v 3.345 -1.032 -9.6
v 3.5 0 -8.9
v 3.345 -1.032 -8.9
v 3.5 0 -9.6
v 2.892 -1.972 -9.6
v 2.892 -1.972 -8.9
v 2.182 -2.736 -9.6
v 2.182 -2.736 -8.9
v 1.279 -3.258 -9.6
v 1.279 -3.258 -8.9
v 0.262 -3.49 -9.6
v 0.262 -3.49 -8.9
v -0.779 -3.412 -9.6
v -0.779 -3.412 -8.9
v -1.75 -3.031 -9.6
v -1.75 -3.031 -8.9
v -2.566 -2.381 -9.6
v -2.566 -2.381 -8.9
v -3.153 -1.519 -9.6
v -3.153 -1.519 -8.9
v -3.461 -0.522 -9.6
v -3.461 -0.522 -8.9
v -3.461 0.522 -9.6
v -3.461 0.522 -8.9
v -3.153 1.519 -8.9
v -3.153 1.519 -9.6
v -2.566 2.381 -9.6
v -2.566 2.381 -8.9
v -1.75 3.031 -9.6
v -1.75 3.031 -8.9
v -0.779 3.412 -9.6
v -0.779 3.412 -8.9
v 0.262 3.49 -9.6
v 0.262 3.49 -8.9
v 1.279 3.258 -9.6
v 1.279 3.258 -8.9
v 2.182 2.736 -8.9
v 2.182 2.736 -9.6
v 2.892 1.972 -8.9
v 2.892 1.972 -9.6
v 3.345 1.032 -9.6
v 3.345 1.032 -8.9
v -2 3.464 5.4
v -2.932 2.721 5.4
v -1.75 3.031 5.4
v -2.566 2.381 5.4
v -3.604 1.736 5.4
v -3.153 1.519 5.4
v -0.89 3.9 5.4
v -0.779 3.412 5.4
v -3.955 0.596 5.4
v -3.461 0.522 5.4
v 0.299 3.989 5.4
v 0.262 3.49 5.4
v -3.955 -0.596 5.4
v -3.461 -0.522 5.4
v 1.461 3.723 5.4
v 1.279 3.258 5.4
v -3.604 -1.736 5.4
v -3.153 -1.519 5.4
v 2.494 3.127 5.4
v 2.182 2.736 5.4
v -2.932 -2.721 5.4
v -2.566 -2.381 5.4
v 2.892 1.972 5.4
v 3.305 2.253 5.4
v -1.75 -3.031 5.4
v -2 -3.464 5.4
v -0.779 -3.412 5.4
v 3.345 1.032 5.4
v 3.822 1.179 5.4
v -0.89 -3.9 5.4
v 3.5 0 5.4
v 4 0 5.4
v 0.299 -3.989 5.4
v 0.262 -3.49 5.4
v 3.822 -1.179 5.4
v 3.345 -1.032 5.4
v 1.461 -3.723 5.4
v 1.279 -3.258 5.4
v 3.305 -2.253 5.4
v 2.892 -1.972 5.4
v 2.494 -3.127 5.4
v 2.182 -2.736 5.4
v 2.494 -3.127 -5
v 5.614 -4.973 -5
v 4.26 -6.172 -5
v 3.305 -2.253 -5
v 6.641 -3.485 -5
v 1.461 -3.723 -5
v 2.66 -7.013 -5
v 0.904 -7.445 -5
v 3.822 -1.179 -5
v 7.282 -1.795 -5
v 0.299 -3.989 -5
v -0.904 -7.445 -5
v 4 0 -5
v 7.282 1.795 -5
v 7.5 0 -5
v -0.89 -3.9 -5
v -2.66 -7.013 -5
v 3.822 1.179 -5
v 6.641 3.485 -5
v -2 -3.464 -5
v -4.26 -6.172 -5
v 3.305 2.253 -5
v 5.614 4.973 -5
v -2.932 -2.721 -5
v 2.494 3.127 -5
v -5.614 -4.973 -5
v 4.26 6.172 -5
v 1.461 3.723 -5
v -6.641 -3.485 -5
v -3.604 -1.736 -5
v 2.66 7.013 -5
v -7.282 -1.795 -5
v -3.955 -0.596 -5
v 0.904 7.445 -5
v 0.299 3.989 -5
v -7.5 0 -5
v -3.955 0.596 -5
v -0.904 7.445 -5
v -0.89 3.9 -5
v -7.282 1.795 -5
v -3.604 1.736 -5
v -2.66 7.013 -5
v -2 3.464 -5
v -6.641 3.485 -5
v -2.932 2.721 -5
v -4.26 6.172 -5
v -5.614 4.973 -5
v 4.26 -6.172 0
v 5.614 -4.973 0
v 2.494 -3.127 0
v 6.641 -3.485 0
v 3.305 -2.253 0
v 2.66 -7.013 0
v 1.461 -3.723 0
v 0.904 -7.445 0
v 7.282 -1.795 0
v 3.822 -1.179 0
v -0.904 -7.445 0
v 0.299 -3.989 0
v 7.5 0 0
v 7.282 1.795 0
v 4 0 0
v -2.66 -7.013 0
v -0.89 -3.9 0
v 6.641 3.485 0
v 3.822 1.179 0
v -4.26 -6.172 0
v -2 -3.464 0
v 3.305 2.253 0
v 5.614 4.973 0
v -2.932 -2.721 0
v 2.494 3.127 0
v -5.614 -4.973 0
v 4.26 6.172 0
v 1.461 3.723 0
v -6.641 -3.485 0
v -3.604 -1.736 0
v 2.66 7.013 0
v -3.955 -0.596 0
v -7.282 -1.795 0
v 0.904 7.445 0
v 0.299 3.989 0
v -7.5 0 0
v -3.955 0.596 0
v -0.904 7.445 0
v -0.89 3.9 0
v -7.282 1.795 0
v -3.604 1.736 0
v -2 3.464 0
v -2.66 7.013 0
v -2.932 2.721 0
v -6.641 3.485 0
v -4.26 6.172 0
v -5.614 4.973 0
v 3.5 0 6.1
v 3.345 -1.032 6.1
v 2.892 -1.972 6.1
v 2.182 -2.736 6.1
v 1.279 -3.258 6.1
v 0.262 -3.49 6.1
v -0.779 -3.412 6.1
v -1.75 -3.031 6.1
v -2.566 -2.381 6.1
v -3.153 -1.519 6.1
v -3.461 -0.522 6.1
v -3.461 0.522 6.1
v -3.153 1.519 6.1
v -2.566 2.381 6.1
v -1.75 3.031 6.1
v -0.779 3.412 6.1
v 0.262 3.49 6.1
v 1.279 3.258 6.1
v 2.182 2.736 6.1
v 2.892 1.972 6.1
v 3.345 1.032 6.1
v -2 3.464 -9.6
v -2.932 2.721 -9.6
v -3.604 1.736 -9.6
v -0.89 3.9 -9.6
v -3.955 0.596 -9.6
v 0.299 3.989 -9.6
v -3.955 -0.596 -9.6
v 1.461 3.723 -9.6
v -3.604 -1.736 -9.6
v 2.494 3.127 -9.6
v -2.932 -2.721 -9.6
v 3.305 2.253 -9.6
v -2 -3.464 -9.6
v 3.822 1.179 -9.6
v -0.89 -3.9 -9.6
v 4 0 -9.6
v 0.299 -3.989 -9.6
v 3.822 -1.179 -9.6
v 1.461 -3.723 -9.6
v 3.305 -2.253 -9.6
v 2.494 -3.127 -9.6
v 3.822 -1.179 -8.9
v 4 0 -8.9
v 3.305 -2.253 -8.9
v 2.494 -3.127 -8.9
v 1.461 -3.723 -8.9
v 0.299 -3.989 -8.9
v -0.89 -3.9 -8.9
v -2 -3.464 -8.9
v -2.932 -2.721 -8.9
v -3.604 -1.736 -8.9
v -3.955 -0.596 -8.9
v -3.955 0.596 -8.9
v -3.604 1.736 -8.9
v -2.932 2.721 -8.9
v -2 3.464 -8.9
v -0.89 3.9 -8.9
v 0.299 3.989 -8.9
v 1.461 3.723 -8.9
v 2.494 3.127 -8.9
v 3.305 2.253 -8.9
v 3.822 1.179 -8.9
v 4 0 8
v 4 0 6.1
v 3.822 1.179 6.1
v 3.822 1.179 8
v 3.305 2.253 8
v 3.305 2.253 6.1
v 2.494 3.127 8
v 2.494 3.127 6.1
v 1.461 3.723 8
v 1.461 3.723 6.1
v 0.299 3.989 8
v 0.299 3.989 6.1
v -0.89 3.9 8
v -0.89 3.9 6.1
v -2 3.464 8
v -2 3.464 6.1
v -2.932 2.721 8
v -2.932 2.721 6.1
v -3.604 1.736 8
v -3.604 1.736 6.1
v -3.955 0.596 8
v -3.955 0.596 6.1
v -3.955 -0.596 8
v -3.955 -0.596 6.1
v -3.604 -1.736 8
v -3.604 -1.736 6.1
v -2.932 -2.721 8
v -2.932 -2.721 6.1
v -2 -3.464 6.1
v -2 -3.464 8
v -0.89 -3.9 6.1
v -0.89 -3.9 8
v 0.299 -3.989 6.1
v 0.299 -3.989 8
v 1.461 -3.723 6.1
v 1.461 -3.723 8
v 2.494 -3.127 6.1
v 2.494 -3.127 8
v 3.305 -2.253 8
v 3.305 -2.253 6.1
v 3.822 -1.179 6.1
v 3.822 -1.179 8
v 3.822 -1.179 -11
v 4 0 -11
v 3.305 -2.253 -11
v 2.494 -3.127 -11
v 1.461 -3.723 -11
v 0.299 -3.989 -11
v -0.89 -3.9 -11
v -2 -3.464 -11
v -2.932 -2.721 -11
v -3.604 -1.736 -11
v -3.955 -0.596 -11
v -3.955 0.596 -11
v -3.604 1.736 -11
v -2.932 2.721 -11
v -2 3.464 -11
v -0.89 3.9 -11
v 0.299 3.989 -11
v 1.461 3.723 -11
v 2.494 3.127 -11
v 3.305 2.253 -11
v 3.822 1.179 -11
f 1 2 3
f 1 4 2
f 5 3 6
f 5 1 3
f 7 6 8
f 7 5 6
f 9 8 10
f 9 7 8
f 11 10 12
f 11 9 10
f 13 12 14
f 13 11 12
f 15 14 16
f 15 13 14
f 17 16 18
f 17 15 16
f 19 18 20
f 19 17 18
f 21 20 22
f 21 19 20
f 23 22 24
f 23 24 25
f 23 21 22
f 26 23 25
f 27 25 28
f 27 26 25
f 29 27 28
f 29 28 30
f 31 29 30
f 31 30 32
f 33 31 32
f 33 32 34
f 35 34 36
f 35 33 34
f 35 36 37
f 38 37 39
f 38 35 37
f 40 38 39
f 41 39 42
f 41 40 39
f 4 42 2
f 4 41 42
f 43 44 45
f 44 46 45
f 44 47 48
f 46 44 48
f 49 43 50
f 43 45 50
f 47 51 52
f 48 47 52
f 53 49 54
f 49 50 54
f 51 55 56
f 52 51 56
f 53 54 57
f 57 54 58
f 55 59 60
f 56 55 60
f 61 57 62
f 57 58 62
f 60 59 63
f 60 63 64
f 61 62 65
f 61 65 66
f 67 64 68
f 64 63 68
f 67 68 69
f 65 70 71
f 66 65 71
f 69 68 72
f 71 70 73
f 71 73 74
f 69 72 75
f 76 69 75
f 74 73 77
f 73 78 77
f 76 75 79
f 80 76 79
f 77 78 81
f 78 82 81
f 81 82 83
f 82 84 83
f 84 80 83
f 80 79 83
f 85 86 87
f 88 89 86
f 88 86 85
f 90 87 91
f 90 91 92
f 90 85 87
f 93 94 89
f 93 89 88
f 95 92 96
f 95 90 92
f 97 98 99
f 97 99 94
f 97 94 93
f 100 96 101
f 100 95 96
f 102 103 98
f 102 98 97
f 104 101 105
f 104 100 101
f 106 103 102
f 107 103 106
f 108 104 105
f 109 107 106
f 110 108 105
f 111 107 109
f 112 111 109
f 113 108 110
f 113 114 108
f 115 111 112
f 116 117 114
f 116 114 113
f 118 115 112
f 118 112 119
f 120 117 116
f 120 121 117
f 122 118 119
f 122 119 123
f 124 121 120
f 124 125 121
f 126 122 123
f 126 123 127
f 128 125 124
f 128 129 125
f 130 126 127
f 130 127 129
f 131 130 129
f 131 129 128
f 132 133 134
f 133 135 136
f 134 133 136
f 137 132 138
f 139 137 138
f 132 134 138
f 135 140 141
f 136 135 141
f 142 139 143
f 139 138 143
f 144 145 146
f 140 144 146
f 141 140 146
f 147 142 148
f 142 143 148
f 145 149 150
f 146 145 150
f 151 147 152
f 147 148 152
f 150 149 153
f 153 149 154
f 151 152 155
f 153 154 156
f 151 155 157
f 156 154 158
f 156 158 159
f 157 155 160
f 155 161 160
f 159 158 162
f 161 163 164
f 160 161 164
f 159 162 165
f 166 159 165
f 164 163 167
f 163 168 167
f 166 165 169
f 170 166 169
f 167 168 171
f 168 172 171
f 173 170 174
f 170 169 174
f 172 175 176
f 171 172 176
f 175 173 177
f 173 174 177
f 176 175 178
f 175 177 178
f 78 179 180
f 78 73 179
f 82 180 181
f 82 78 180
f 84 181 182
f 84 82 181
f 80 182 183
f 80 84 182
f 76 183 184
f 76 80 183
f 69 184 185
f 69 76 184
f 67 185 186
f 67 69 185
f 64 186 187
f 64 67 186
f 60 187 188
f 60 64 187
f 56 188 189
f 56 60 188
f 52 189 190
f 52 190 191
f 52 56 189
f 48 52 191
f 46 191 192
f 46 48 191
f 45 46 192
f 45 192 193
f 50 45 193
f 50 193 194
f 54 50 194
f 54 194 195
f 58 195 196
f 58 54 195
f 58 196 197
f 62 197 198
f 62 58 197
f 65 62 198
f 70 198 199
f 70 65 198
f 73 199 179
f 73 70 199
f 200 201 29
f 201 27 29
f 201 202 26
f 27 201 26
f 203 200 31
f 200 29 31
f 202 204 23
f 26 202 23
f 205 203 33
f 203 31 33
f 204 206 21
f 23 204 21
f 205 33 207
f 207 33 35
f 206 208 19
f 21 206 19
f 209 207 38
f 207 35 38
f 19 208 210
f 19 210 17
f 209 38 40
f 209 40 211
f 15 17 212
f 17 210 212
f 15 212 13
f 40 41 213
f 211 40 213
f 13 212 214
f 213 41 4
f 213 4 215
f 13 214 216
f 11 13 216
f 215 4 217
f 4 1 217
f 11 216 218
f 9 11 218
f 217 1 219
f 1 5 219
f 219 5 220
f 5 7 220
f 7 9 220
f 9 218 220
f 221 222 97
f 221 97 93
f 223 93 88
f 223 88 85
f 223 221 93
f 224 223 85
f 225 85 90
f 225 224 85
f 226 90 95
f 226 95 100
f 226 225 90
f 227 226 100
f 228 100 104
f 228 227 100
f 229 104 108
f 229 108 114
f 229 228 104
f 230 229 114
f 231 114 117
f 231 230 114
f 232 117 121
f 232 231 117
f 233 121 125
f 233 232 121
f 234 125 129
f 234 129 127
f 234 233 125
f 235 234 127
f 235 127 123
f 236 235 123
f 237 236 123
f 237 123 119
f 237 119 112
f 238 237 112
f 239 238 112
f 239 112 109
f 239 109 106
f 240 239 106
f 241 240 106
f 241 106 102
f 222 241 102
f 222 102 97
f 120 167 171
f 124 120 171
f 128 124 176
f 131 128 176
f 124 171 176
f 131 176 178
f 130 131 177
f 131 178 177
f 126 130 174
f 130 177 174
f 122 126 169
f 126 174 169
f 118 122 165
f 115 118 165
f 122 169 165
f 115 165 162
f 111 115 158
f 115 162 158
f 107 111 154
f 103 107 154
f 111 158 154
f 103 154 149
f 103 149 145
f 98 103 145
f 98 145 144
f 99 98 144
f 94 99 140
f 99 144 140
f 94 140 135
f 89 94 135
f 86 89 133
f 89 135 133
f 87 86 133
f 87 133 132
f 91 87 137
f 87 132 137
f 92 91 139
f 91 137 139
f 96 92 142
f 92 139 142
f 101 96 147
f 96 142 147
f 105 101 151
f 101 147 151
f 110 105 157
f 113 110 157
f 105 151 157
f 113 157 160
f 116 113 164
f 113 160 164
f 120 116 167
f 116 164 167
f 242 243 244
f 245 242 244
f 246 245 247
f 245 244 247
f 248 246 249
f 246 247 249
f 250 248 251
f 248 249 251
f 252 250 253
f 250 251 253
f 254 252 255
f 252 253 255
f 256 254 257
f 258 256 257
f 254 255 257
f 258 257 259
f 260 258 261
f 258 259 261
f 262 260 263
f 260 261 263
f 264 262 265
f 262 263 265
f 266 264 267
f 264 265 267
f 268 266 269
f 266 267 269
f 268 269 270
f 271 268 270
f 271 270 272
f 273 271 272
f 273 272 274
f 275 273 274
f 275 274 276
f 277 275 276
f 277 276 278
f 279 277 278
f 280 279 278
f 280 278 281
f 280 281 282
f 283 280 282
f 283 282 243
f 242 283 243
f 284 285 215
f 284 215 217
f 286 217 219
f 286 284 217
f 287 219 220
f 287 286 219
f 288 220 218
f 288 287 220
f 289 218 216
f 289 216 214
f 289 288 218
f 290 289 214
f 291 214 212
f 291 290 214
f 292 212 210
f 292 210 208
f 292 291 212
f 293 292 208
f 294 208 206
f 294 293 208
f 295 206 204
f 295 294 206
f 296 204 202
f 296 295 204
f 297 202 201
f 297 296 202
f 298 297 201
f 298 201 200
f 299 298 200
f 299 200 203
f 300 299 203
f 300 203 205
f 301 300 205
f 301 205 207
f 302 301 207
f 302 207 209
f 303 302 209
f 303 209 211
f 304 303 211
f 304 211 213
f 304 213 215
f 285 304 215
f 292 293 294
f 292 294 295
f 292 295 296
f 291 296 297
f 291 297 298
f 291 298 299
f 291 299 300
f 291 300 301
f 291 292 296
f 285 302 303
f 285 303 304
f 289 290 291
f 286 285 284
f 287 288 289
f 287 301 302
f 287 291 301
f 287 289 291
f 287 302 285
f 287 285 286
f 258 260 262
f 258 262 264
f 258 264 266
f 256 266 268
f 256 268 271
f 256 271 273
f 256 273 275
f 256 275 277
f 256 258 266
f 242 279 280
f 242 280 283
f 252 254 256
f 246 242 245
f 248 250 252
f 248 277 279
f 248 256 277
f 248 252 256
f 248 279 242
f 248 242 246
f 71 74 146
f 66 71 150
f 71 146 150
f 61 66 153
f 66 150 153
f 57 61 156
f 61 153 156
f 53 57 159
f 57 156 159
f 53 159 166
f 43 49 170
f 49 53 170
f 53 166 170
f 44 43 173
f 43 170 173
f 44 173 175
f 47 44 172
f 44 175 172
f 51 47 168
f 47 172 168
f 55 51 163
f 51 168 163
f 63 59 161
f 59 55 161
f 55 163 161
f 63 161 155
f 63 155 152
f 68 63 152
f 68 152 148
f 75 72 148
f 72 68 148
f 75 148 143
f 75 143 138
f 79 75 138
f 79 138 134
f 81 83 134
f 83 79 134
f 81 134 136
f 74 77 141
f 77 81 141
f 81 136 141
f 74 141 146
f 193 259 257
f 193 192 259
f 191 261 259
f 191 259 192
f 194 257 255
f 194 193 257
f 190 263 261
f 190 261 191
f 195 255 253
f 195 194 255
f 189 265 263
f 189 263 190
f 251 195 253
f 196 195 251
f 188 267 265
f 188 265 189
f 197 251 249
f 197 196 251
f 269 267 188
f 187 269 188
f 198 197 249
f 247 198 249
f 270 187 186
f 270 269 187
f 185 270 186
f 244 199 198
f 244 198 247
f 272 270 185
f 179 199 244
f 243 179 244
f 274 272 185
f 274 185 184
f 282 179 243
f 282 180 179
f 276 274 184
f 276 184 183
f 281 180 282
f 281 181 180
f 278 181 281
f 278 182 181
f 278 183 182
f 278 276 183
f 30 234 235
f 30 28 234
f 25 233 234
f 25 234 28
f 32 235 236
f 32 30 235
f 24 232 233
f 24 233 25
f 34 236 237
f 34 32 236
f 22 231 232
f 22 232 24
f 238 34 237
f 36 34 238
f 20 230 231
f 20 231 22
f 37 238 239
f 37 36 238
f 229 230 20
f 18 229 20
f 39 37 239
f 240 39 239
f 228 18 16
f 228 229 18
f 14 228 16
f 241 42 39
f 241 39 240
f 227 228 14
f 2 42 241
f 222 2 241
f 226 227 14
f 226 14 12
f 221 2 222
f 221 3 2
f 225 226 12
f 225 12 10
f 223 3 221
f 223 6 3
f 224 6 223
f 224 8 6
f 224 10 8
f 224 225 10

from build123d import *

# Parameters (mm, degrees)
SKETCH1_R           = 4
BOSS_EXTRUDE1_DEPTH = 8
SKETCH2_R           = 7.5
BOSS_EXTRUDE2_DEPTH = 5
BOSS_EXTRUDE3_START = 6
SKETCH3_R           = 4
BOSS_EXTRUDE3_DEPTH = 6
SKETCH4_W           = 0.5
SKETCH4_H           = 0.7


with BuildPart() as part:
    # Sketch1 → Boss-Extrude1 (new body)
    with BuildSketch(Plane.XY):
        Circle(SKETCH1_R)
    extrude(amount=BOSS_EXTRUDE1_DEPTH)

    # Sketch2 → Boss-Extrude2 (add)
    with BuildSketch(Plane(origin=(0, 0, 0), x_dir=(-1, 0, 0), z_dir=(0, 0, -1))):
        Circle(SKETCH2_R)
    extrude(amount=BOSS_EXTRUDE2_DEPTH)

    # Sketch3 → Boss-Extrude3 (add)
    with BuildSketch(Plane(origin=(0, 0, -5), x_dir=(-1, 0, 0), z_dir=(0, 0, -1)).offset(BOSS_EXTRUDE3_START)):
        with Locations(Location((0, 0, 0), (0, 0, 180))):
            Circle(SKETCH3_R)
    extrude(amount=-BOSS_EXTRUDE3_DEPTH)

    # Sketch4 → Cut-Revolve1 (revolve, cut)
    with BuildSketch(Plane(origin=(0, 0, 0), x_dir=(1, 0, 0), z_dir=(0, 1, 0)), mode=Mode.PRIVATE) as cut_revolve1_sk:
        with Locations((-3.75, -5.75)):
            Rectangle(SKETCH4_W, SKETCH4_H)
        with Locations((-3.75, 9.25)):
            Rectangle(SKETCH4_W, SKETCH4_H)
    revolve(cut_revolve1_sk.sketch.rotate(Axis((0, 0, 0), (0, 0, -1)), 180), axis=Axis((0, 0, 0), (0, 0, -1)), mode=Mode.SUBTRACT)


solid = part.part
